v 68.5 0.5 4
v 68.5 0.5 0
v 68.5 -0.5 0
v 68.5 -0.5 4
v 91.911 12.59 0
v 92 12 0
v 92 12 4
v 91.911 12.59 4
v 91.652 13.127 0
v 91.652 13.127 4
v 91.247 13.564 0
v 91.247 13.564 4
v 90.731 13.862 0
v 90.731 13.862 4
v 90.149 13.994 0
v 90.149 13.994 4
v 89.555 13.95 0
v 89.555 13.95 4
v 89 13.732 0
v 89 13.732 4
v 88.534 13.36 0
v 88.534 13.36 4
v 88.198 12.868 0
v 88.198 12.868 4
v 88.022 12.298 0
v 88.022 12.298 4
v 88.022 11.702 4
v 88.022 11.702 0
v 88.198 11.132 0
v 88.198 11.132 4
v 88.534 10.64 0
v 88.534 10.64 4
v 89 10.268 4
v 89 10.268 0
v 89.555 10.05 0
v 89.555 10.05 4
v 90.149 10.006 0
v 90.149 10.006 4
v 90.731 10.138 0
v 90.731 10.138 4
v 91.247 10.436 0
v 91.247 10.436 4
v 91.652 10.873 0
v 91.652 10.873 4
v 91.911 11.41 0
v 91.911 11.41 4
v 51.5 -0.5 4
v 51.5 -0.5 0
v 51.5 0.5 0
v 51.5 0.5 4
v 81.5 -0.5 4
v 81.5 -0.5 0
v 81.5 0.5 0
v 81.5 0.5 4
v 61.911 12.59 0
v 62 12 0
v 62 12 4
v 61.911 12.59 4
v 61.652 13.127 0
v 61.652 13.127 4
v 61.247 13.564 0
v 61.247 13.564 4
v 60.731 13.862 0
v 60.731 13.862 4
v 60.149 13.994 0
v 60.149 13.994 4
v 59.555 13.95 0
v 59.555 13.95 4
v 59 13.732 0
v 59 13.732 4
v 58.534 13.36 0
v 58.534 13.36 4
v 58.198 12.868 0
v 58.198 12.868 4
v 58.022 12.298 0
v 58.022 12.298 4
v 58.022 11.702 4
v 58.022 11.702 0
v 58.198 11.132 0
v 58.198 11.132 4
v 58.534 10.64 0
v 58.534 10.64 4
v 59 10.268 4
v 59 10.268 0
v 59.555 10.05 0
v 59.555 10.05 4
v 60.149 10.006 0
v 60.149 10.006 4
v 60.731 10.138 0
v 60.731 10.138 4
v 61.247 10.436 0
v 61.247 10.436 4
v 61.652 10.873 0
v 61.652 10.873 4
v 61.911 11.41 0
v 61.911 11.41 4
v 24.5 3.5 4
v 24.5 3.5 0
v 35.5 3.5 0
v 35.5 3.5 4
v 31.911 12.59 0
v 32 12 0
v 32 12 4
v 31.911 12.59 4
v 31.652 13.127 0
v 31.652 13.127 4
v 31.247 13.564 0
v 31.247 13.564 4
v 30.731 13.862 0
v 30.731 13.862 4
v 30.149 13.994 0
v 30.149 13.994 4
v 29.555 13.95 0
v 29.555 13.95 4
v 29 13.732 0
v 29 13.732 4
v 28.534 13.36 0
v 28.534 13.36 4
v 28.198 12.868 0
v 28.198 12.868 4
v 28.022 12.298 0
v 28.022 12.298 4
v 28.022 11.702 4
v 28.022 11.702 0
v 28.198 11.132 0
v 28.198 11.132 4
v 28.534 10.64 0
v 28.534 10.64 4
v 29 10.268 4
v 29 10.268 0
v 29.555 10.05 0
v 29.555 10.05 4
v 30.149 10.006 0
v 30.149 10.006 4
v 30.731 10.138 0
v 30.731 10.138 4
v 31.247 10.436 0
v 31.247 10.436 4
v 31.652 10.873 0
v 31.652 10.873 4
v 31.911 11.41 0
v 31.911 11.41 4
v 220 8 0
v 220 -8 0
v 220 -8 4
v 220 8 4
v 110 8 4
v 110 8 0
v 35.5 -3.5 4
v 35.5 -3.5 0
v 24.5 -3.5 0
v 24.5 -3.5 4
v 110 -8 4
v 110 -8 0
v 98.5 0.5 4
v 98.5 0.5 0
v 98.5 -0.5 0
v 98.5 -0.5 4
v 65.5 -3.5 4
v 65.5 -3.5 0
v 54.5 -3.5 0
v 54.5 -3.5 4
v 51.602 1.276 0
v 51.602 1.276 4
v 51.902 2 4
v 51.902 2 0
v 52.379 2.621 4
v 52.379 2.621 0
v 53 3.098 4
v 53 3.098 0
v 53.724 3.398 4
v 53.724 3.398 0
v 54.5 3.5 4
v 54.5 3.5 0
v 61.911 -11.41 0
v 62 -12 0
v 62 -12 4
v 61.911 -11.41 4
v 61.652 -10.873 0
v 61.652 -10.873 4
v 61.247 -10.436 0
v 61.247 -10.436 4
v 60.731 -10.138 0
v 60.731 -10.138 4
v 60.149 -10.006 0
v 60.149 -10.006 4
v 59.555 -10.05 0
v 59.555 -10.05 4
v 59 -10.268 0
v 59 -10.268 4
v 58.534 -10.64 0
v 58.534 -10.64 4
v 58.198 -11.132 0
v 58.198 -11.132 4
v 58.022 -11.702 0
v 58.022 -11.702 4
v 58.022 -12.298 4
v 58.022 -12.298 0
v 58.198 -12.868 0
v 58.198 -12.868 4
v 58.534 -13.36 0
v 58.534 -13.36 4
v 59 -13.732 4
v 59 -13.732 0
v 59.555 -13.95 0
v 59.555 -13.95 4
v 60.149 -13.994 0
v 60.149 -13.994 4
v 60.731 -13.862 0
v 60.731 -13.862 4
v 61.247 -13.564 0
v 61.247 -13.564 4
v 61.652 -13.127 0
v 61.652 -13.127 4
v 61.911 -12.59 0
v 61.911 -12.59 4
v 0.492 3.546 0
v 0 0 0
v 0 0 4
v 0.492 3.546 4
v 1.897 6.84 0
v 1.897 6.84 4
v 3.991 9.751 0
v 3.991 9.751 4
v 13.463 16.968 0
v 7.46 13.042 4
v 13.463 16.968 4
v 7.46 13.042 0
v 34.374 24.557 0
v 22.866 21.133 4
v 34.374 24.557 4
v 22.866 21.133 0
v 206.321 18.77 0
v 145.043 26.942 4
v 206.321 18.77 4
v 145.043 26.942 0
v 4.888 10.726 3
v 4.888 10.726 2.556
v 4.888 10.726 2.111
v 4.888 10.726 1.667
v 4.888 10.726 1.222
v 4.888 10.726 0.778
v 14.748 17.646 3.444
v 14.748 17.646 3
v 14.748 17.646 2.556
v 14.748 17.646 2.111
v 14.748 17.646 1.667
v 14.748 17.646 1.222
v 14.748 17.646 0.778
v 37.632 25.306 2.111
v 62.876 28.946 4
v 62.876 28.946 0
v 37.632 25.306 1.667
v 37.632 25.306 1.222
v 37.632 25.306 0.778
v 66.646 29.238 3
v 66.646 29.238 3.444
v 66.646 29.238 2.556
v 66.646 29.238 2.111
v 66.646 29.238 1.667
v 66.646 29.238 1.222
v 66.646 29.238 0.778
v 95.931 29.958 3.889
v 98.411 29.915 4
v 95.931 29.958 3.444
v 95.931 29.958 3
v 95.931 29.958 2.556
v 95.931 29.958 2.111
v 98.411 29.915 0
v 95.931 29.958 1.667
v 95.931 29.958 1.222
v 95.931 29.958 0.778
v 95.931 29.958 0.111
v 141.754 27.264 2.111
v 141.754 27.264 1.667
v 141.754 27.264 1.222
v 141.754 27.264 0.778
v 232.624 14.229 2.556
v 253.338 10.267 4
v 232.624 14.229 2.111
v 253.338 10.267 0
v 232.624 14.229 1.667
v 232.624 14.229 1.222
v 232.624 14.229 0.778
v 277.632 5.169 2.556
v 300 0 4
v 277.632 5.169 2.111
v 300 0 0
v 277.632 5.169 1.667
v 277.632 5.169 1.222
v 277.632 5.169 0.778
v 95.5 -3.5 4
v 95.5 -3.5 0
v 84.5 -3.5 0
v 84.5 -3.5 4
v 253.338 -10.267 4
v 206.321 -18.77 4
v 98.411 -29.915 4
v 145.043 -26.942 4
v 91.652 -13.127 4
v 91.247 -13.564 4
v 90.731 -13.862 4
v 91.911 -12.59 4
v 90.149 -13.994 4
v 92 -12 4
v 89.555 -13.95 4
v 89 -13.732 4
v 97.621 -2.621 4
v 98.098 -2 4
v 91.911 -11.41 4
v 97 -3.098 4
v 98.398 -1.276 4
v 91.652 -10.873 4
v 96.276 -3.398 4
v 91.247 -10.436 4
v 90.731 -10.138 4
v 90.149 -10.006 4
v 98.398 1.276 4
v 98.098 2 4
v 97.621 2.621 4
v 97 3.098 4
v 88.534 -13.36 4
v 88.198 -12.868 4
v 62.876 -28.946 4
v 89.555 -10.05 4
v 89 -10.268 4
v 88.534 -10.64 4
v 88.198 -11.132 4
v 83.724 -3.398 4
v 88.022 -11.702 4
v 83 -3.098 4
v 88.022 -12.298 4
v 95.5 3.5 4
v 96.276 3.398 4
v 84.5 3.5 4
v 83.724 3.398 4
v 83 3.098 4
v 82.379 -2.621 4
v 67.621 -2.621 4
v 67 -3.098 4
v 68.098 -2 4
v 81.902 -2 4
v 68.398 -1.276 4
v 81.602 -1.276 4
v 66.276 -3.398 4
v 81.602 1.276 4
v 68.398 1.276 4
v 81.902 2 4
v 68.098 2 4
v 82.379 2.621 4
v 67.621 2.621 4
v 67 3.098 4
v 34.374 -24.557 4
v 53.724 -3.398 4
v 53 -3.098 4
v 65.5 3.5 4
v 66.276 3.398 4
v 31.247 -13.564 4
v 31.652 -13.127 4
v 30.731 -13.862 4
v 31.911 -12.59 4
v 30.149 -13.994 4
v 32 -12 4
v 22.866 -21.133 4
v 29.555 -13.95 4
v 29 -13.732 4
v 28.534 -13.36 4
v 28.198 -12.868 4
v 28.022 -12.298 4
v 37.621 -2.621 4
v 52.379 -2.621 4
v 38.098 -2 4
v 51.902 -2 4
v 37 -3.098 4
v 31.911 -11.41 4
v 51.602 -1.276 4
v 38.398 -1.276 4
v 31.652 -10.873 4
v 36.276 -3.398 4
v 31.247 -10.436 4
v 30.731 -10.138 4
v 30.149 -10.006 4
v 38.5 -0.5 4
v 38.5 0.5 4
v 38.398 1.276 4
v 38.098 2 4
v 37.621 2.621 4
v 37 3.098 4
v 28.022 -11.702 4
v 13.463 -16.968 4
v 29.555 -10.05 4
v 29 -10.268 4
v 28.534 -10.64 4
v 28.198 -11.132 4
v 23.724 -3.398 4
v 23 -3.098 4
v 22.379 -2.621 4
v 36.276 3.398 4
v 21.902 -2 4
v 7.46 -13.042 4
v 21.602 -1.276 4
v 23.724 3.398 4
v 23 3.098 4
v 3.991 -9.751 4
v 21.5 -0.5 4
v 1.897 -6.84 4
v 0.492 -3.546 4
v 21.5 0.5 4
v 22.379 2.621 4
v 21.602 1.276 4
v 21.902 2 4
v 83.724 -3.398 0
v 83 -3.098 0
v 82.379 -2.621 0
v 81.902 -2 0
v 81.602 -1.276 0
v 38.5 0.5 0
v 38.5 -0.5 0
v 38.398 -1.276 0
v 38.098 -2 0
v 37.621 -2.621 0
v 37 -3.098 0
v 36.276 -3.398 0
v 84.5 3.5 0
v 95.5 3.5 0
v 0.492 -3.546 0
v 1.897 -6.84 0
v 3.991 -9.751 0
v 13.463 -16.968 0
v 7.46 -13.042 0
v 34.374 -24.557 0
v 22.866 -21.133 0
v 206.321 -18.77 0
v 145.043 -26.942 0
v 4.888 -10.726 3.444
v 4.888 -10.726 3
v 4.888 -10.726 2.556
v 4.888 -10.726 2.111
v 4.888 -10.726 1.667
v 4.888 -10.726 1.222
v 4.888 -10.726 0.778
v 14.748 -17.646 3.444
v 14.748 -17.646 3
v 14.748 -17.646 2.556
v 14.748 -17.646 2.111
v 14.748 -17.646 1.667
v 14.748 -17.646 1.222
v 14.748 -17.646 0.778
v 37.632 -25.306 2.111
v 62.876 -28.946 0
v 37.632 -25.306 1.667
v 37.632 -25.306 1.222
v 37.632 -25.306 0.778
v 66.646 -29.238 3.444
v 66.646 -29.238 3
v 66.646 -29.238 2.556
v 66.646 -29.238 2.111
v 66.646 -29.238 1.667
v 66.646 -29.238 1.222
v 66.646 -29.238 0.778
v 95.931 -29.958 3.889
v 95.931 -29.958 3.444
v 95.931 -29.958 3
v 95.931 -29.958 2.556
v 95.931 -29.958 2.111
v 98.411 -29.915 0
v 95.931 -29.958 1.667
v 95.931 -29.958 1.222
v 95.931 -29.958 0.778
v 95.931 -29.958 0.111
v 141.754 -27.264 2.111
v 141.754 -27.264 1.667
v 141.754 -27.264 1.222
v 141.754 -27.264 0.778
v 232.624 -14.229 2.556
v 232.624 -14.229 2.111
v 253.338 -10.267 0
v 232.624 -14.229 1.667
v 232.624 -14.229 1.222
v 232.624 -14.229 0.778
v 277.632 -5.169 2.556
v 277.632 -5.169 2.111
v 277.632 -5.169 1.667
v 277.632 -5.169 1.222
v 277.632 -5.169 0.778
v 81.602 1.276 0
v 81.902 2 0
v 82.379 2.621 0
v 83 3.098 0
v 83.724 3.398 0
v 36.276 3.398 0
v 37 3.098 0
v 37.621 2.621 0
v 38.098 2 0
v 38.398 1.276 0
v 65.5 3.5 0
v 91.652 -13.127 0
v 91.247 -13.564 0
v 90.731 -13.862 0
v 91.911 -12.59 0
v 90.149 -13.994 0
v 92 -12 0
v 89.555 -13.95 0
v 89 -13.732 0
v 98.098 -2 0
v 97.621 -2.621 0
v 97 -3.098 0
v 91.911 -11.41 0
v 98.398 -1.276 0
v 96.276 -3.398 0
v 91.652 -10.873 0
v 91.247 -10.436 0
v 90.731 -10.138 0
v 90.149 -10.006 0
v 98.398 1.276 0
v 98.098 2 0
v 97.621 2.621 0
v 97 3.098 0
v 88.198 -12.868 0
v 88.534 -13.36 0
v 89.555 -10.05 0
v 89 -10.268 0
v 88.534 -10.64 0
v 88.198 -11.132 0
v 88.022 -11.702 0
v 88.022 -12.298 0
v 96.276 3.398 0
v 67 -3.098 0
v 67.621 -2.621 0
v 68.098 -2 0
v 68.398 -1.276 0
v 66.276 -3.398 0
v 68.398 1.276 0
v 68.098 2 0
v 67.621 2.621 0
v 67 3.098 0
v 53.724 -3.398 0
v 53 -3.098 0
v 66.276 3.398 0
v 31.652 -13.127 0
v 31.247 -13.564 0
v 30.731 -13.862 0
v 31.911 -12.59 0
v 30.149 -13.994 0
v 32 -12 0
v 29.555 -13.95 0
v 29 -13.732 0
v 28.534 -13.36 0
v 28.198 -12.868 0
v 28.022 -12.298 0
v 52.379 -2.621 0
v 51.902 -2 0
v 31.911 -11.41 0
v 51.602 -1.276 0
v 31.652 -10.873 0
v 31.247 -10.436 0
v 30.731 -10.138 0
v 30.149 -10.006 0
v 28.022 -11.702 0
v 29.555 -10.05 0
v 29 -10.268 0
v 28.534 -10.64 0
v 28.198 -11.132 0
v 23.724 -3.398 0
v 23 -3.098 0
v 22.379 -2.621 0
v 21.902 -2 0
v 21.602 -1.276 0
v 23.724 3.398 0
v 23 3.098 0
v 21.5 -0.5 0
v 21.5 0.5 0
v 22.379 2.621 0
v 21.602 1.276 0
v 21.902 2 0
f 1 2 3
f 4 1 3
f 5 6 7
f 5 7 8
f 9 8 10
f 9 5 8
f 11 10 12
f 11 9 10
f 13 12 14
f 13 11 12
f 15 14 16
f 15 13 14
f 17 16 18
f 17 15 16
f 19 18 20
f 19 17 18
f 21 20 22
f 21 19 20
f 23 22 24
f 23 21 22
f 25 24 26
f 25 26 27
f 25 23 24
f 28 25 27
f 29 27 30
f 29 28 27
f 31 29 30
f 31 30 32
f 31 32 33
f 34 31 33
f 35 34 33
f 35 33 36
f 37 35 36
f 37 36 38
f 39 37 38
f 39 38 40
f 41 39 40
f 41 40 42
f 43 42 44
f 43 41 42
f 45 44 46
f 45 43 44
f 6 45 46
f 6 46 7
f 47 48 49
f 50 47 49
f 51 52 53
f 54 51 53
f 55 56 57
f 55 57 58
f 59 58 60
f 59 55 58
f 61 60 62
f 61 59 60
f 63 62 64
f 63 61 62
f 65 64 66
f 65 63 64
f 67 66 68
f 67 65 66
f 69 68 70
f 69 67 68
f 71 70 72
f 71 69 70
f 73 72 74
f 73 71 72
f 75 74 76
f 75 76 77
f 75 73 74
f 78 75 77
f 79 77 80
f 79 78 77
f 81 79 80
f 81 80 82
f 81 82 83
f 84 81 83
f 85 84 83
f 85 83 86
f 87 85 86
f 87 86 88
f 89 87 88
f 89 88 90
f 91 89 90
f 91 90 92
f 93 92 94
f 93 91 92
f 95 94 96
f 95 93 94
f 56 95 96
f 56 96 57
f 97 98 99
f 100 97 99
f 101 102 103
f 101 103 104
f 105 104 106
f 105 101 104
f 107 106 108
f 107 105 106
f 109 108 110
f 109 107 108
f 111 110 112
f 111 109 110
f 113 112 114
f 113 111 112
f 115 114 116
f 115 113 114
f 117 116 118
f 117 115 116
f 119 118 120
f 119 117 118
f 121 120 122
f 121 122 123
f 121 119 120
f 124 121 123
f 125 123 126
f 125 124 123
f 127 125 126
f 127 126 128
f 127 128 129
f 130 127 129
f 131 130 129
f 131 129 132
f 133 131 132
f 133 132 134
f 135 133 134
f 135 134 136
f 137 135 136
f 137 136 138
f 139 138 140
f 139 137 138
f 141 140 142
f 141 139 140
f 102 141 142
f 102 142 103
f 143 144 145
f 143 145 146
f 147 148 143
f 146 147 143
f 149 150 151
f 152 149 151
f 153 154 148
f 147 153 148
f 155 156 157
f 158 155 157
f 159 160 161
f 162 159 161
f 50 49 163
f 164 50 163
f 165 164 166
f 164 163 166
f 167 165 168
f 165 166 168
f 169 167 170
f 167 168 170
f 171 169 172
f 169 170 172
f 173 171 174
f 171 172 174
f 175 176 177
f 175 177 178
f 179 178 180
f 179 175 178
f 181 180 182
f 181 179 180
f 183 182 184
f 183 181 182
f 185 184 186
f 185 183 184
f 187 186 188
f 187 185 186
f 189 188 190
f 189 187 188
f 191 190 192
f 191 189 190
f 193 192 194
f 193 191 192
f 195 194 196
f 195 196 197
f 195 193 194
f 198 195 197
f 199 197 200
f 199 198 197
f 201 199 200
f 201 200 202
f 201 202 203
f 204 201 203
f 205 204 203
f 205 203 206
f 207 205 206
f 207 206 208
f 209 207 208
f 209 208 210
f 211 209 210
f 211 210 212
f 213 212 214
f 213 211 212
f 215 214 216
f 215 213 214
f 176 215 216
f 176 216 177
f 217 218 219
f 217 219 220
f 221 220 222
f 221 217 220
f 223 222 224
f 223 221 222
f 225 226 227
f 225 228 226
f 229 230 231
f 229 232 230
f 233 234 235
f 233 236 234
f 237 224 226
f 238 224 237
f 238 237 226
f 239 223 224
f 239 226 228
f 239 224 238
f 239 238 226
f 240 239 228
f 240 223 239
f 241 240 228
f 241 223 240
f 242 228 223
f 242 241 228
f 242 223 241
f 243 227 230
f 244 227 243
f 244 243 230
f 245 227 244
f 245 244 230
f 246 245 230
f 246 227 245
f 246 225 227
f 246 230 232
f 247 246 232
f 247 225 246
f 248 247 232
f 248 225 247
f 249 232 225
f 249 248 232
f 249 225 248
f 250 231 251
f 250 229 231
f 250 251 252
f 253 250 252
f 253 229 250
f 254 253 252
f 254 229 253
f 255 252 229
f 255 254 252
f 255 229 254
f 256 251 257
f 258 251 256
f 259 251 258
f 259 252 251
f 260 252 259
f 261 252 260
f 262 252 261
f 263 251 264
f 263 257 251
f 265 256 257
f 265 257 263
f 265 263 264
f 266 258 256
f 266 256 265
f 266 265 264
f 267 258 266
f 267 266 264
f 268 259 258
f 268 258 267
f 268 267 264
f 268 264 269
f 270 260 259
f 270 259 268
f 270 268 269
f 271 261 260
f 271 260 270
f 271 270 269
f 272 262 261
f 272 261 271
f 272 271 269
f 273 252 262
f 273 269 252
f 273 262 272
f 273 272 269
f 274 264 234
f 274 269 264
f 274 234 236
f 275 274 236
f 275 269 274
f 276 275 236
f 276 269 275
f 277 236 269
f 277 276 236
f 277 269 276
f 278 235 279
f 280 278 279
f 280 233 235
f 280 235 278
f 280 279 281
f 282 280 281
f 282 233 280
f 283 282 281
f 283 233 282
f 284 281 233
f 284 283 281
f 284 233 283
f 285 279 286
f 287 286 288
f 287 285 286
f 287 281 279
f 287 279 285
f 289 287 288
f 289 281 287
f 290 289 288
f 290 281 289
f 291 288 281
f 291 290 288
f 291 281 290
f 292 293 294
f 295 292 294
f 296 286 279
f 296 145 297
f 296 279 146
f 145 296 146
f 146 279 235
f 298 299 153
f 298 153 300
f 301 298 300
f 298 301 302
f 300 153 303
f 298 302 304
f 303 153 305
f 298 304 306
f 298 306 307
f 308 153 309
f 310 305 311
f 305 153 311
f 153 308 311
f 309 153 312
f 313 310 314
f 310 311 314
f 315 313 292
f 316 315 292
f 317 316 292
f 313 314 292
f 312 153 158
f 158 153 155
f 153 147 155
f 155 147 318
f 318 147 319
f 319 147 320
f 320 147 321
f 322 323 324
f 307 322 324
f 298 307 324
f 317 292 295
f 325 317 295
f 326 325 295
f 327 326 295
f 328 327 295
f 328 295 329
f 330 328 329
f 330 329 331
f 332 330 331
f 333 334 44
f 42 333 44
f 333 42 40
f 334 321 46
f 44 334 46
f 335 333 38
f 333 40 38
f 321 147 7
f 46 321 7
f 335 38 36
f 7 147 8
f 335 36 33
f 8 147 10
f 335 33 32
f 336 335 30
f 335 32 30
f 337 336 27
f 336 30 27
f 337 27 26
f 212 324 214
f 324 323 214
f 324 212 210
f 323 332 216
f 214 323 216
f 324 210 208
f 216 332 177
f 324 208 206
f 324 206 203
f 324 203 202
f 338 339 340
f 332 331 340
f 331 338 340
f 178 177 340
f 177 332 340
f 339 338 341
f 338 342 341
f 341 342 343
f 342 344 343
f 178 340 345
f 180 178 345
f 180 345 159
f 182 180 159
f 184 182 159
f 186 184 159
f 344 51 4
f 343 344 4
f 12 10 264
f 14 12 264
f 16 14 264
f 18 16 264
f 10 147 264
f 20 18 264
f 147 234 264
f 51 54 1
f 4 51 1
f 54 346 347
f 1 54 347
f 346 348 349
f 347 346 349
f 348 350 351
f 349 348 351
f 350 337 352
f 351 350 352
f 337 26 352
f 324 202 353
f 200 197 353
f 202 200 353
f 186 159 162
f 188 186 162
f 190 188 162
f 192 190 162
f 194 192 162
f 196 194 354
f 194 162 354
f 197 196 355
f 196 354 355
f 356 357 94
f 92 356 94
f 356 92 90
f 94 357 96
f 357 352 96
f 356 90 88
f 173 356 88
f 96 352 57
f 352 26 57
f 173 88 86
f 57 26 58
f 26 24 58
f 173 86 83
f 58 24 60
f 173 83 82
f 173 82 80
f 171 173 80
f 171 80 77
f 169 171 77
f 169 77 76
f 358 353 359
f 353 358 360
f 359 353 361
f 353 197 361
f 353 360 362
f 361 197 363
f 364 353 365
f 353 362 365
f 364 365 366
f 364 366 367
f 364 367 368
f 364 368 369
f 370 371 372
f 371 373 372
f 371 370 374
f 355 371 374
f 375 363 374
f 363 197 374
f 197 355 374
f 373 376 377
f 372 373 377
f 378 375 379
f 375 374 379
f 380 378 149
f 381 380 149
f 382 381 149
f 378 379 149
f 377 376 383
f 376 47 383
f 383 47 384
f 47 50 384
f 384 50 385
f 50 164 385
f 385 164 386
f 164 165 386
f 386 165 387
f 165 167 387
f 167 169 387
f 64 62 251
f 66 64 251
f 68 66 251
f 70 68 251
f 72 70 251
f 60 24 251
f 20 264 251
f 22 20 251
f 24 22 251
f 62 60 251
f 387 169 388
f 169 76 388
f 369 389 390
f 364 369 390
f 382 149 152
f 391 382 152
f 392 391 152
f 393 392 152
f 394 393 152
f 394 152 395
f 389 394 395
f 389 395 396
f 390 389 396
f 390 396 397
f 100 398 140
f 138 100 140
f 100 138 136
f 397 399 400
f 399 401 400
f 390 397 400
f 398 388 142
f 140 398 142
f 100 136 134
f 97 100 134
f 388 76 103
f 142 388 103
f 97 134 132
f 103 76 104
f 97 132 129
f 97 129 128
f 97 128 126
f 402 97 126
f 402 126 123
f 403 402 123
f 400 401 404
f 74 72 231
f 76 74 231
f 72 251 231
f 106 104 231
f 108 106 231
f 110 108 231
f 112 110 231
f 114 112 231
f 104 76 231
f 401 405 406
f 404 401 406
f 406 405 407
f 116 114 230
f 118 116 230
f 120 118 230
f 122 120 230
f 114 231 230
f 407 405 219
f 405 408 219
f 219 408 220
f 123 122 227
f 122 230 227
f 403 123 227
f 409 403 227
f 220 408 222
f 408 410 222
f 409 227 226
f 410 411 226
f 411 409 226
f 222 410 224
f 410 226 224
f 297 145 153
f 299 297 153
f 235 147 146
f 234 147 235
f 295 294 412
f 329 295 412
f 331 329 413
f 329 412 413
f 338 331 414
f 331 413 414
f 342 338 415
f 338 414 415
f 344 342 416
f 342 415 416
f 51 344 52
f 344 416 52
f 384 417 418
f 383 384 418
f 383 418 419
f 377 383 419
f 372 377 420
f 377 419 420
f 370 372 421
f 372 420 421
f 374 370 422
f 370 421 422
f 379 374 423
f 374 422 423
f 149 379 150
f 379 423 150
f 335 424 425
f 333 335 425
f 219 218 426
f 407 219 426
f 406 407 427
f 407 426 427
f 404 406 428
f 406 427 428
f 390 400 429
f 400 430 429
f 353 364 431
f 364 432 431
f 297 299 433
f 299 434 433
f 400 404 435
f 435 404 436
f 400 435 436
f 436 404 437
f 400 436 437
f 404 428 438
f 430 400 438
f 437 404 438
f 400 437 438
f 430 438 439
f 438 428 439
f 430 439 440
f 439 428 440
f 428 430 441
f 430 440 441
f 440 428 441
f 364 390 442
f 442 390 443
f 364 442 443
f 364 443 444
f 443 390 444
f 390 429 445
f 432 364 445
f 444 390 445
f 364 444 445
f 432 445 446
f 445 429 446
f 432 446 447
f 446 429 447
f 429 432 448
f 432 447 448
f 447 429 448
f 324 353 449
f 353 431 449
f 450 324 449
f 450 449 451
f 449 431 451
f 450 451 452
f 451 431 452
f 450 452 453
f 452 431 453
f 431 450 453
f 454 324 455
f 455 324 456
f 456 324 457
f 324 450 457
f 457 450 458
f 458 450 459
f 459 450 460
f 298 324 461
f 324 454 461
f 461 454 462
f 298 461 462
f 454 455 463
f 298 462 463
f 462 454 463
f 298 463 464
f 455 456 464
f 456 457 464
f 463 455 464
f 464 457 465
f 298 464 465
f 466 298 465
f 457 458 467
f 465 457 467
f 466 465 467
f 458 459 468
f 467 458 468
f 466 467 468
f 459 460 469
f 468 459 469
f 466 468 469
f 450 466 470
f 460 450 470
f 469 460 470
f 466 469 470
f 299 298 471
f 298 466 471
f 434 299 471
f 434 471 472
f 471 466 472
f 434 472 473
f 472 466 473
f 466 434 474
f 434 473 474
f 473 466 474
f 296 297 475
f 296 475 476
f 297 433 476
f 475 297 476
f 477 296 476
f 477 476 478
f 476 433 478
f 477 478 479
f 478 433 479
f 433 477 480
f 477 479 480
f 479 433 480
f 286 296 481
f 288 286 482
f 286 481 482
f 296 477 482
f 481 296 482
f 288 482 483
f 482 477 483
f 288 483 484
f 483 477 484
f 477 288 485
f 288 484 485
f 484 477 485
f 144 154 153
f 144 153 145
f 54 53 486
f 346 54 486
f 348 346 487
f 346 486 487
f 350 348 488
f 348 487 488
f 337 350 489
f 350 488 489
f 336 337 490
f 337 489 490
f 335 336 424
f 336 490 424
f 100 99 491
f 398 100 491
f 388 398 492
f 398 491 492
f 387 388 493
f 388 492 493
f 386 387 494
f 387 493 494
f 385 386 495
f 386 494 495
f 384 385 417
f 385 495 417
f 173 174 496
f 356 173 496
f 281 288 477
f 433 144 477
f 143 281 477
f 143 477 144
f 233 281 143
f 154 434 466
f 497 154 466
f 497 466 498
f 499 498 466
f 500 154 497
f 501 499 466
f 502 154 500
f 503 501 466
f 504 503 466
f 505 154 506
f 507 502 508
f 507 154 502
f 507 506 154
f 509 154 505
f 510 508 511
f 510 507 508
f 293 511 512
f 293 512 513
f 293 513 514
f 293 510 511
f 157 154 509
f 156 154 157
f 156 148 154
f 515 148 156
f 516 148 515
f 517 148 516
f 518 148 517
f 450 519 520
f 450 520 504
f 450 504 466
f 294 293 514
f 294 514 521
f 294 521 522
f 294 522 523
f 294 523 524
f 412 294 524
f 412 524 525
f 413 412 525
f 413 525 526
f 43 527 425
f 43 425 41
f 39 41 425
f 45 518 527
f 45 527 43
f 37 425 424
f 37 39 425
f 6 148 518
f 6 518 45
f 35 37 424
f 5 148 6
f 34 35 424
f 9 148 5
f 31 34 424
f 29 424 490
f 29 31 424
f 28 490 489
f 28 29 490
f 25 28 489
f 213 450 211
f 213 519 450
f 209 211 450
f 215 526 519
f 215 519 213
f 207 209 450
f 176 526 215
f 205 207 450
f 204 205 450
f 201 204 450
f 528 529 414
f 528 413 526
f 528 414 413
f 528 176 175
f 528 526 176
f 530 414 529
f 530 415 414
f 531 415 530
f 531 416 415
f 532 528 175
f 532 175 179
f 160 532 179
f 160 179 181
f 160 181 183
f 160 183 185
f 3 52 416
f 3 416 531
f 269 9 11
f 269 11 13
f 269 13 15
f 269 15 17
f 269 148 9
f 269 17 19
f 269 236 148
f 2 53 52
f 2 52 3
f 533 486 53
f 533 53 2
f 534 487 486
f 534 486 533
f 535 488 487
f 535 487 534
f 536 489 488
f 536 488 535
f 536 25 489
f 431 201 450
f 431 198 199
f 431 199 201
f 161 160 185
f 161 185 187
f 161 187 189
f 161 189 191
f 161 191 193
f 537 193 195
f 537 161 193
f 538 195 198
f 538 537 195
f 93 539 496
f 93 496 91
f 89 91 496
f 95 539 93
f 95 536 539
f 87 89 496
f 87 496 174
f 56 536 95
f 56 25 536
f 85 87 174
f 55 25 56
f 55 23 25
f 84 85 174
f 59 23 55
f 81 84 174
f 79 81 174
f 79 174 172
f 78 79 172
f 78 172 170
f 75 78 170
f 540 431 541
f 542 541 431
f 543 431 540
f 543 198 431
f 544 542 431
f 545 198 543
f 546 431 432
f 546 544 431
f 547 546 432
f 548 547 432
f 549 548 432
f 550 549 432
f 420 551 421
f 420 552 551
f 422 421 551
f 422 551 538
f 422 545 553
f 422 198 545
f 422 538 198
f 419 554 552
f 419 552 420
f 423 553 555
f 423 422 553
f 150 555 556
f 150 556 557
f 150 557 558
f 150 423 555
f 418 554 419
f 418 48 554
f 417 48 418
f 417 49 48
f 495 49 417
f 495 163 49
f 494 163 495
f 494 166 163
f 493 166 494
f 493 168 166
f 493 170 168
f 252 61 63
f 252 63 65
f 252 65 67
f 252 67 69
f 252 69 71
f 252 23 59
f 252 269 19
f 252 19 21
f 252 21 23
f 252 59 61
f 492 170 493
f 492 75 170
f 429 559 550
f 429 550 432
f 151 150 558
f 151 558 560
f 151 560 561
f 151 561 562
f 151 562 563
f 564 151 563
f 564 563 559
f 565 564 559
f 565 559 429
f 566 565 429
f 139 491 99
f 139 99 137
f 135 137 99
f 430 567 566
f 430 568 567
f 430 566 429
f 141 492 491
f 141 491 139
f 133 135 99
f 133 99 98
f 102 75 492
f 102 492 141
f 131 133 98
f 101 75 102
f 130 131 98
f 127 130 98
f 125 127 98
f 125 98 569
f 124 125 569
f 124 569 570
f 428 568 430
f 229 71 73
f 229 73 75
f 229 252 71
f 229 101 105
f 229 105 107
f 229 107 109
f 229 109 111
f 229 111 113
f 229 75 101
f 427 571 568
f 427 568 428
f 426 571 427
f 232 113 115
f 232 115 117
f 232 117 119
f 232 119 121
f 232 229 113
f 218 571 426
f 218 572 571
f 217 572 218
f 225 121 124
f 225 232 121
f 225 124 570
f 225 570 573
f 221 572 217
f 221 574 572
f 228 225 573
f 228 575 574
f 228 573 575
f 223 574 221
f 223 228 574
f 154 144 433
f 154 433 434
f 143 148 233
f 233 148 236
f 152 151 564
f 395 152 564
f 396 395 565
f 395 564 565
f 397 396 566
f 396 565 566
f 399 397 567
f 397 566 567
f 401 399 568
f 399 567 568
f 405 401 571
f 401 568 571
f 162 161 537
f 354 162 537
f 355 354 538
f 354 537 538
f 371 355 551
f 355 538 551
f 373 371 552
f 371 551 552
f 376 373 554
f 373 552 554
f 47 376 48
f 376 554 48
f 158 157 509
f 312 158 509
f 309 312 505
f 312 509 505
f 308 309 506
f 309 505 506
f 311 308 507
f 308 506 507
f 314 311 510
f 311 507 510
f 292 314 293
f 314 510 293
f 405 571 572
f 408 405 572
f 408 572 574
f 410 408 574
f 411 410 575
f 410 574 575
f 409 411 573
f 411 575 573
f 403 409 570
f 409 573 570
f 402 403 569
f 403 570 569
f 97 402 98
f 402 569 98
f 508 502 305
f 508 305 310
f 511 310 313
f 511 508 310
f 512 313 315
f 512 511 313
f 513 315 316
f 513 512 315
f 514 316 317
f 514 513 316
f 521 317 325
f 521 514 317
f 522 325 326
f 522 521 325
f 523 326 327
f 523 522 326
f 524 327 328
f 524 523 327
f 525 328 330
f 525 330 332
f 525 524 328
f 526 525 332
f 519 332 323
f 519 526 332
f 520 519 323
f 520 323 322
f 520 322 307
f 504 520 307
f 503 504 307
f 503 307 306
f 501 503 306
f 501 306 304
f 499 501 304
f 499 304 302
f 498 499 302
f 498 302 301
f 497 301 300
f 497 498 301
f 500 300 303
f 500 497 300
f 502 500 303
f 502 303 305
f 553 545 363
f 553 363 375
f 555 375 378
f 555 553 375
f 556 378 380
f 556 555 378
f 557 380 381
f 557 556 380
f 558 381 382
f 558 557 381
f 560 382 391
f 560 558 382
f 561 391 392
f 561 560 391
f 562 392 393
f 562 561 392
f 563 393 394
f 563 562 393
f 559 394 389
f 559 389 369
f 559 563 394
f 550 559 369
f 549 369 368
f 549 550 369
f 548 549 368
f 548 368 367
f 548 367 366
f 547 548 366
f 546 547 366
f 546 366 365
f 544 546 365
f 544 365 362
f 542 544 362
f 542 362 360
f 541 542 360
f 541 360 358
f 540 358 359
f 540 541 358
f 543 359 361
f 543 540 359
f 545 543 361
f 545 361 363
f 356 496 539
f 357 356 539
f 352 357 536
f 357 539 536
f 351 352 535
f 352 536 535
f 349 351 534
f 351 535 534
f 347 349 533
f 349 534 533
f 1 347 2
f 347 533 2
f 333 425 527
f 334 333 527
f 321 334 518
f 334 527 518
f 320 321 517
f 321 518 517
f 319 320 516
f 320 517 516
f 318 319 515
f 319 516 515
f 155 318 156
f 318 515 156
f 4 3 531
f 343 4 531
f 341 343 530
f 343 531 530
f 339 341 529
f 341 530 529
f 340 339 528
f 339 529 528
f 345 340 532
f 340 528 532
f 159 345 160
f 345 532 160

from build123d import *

# Parameters (mm, degrees)
SKETCH_1_R      = 2
SKETCH_1_W      = 110
SKETCH_1_H      = 16
EXTRUDE_1_DEPTH = 4


with BuildPart() as part:
    # 草图1 → 凸台-拉伸1 (new body)
    with BuildSketch(Plane.XY):
        with BuildLine():
            add(Edge.make_bspline(
                [(0, 0), (-0.00021229, 0.506970744), (0.044864754, 1.381714413), (0.226017079, 2.650839475), (0.688025344, 4.299952552), (1.335546305, 5.873041675), (2.26695445, 7.542579189), (3.571946964, 9.346109572), (5.391381815, 11.324673938), (7.954469743, 13.539518757), (11.584975672, 16.021510412), (16.648123966, 18.726988569), (23.793189999, 21.649781435), (33.085765079, 24.436937203), (46.643058908, 27.284493785), (64.063199307, 29.362693495), (84.450847037, 30.260343335), (107.414943041, 29.859960777), (130.332556147, 28.428346139), (153.186136376, 26.214758658), (175.970846287, 23.391654718), (195.848592789, 20.487628812), (212.844945694, 17.732999103), (226.980485609, 15.27094618), (238.271313866, 13.203878393), (248.135151077, 11.310105462), (256.577305747, 9.625486685), (263.604664912, 8.179483676), (269.219788458, 6.997398786), (274.1309907, 5.93944771), (278.331979904, 5.017052178), (281.838528118, 4.234963306), (284.626645762, 3.606112196), (287.446648095, 2.96209323), (290.200347561, 2.326575377), (293.076089097, 1.653806717), (295.700233888, 1.034172197), (298.078453529, 0.464134201), (299.36547076, 0.153714708), (299.999999999, 0)],
                knots=[0, 0, 0, 0, 0, 0.005874531, 0.010168378, 0.014828146, 0.019835444, 0.025574736, 0.032308878, 0.040609511, 0.050966894, 0.064812119, 0.083253248, 0.107120705, 0.140429682, 0.177263566, 0.243881637, 0.310499708, 0.377117784, 0.443735861, 0.510353937, 0.576972013, 0.643590091, 0.67689913, 0.710208169, 0.743517207, 0.776826246, 0.793480766, 0.810135286, 0.826789806, 0.843444325, 0.851771585, 0.860098845, 0.868426105, 0.876753365, 0.885080625, 0.893407884, 0.901735144, 0.910062404, 0.910062404, 0.910062404, 0.910062404, 0.910062404], degree=4))
            add(Edge.make_bspline(
                [(0, 0), (-0.00021229, -0.506970744), (0.044864754, -1.381714413), (0.226017079, -2.650839475), (0.688025344, -4.299952552), (1.335546305, -5.873041675), (2.26695445, -7.542579189), (3.571946964, -9.346109572), (5.391381815, -11.324673938), (7.954469743, -13.539518757), (11.584975672, -16.021510412), (16.648123966, -18.726988569), (23.793189999, -21.649781435), (33.085765079, -24.436937203), (46.643058908, -27.284493785), (64.063199307, -29.362693495), (84.450847037, -30.260343335), (107.414943041, -29.859960777), (130.332556147, -28.428346139), (153.186136376, -26.214758658), (175.970846287, -23.391654718), (195.848592789, -20.487628812), (212.844945694, -17.732999103), (226.980485609, -15.27094618), (238.271313866, -13.203878393), (248.135151077, -11.310105462), (256.577305747, -9.625486685), (263.604664912, -8.179483676), (269.219788458, -6.997398786), (274.1309907, -5.93944771), (278.331979904, -5.017052178), (281.838528118, -4.234963306), (284.626645762, -3.606112196), (287.446648095, -2.96209323), (290.200347561, -2.326575377), (293.076089097, -1.653806717), (295.700233888, -1.034172197), (298.078453528, -0.464134202), (299.36547076, -0.153714708), (299.999999999, 0)],
                knots=[0, 0, 0, 0, 0, 0.005874531, 0.010168378, 0.014828146, 0.019835444, 0.025574736, 0.032308878, 0.040609511, 0.050966894, 0.064812119, 0.083253248, 0.107120705, 0.140429682, 0.177263566, 0.243881637, 0.310499708, 0.377117784, 0.443735861, 0.510353937, 0.576972013, 0.643590091, 0.67689913, 0.710208169, 0.743517207, 0.776826246, 0.793480766, 0.810135286, 0.826789806, 0.843444325, 0.851771585, 0.860098845, 0.868426105, 0.876753365, 0.885080625, 0.893407884, 0.901735144, 0.910062404, 0.910062404, 0.910062404, 0.910062404, 0.910062404], degree=4))
        make_face()
        with Locations((30, 12)):
            Circle(SKETCH_1_R, mode=Mode.SUBTRACT)
        with Locations((30, -12)):
            Circle(SKETCH_1_R, mode=Mode.SUBTRACT)
        with Locations((60, 12)):
            Circle(SKETCH_1_R, mode=Mode.SUBTRACT)
        with Locations((60, -12)):
            Circle(SKETCH_1_R, mode=Mode.SUBTRACT)
        with Locations((90, 12)):
            Circle(SKETCH_1_R, mode=Mode.SUBTRACT)
        with Locations((90, -12)):
            Circle(SKETCH_1_R, mode=Mode.SUBTRACT)
        with BuildLine():
            Line((54.5, 3.5), (65.5, 3.5))
            ThreePointArc((65.5, 3.5), (67.621320344, 2.621320344), (68.5, 0.5))
            Line((68.5, 0.5), (68.5, -0.5))
            ThreePointArc((68.5, -0.5), (67.621320344, -2.621320344), (65.5, -3.5))
            Line((65.5, -3.5), (54.5, -3.5))
            ThreePointArc((54.5, -3.5), (52.378679656, -2.621320344), (51.5, -0.5))
            Line((51.5, -0.5), (51.5, 0.5))
            ThreePointArc((51.5, 0.5), (52.378679656, 2.621320344), (54.5, 3.5))
        make_face(mode=Mode.SUBTRACT)
        with BuildLine():
            Line((24.5, 3.5), (35.5, 3.5))
            ThreePointArc((35.5, 3.5), (37.621320344, 2.621320344), (38.5, 0.5))
            Line((38.5, 0.5), (38.5, -0.5))
            ThreePointArc((38.5, -0.5), (37.621320344, -2.621320344), (35.5, -3.5))
            Line((35.5, -3.5), (24.5, -3.5))
            ThreePointArc((24.5, -3.5), (22.378679656, -2.621320344), (21.5, -0.5))
            Line((21.5, -0.5), (21.5, 0.5))
            ThreePointArc((21.5, 0.5), (22.378679656, 2.621320344), (24.5, 3.5))
        make_face(mode=Mode.SUBTRACT)
        with BuildLine():
            Line((84.5, 3.5), (95.5, 3.5))
            ThreePointArc((95.5, 3.5), (97.621320344, 2.621320344), (98.5, 0.5))
            Line((98.5, 0.5), (98.5, -0.5))
            ThreePointArc((98.5, -0.5), (97.621320344, -2.621320344), (95.5, -3.5))
            Line((95.5, -3.5), (84.5, -3.5))
            ThreePointArc((84.5, -3.5), (82.378679656, -2.621320344), (81.5, -0.5))
            Line((81.5, -0.5), (81.5, 0.5))
            ThreePointArc((81.5, 0.5), (82.378679656, 2.621320344), (84.5, 3.5))
        make_face(mode=Mode.SUBTRACT)
        with Locations((165, 0)):
            Rectangle(SKETCH_1_W, SKETCH_1_H, mode=Mode.SUBTRACT)
    extrude(amount=EXTRUDE_1_DEPTH)


solid = part.part
